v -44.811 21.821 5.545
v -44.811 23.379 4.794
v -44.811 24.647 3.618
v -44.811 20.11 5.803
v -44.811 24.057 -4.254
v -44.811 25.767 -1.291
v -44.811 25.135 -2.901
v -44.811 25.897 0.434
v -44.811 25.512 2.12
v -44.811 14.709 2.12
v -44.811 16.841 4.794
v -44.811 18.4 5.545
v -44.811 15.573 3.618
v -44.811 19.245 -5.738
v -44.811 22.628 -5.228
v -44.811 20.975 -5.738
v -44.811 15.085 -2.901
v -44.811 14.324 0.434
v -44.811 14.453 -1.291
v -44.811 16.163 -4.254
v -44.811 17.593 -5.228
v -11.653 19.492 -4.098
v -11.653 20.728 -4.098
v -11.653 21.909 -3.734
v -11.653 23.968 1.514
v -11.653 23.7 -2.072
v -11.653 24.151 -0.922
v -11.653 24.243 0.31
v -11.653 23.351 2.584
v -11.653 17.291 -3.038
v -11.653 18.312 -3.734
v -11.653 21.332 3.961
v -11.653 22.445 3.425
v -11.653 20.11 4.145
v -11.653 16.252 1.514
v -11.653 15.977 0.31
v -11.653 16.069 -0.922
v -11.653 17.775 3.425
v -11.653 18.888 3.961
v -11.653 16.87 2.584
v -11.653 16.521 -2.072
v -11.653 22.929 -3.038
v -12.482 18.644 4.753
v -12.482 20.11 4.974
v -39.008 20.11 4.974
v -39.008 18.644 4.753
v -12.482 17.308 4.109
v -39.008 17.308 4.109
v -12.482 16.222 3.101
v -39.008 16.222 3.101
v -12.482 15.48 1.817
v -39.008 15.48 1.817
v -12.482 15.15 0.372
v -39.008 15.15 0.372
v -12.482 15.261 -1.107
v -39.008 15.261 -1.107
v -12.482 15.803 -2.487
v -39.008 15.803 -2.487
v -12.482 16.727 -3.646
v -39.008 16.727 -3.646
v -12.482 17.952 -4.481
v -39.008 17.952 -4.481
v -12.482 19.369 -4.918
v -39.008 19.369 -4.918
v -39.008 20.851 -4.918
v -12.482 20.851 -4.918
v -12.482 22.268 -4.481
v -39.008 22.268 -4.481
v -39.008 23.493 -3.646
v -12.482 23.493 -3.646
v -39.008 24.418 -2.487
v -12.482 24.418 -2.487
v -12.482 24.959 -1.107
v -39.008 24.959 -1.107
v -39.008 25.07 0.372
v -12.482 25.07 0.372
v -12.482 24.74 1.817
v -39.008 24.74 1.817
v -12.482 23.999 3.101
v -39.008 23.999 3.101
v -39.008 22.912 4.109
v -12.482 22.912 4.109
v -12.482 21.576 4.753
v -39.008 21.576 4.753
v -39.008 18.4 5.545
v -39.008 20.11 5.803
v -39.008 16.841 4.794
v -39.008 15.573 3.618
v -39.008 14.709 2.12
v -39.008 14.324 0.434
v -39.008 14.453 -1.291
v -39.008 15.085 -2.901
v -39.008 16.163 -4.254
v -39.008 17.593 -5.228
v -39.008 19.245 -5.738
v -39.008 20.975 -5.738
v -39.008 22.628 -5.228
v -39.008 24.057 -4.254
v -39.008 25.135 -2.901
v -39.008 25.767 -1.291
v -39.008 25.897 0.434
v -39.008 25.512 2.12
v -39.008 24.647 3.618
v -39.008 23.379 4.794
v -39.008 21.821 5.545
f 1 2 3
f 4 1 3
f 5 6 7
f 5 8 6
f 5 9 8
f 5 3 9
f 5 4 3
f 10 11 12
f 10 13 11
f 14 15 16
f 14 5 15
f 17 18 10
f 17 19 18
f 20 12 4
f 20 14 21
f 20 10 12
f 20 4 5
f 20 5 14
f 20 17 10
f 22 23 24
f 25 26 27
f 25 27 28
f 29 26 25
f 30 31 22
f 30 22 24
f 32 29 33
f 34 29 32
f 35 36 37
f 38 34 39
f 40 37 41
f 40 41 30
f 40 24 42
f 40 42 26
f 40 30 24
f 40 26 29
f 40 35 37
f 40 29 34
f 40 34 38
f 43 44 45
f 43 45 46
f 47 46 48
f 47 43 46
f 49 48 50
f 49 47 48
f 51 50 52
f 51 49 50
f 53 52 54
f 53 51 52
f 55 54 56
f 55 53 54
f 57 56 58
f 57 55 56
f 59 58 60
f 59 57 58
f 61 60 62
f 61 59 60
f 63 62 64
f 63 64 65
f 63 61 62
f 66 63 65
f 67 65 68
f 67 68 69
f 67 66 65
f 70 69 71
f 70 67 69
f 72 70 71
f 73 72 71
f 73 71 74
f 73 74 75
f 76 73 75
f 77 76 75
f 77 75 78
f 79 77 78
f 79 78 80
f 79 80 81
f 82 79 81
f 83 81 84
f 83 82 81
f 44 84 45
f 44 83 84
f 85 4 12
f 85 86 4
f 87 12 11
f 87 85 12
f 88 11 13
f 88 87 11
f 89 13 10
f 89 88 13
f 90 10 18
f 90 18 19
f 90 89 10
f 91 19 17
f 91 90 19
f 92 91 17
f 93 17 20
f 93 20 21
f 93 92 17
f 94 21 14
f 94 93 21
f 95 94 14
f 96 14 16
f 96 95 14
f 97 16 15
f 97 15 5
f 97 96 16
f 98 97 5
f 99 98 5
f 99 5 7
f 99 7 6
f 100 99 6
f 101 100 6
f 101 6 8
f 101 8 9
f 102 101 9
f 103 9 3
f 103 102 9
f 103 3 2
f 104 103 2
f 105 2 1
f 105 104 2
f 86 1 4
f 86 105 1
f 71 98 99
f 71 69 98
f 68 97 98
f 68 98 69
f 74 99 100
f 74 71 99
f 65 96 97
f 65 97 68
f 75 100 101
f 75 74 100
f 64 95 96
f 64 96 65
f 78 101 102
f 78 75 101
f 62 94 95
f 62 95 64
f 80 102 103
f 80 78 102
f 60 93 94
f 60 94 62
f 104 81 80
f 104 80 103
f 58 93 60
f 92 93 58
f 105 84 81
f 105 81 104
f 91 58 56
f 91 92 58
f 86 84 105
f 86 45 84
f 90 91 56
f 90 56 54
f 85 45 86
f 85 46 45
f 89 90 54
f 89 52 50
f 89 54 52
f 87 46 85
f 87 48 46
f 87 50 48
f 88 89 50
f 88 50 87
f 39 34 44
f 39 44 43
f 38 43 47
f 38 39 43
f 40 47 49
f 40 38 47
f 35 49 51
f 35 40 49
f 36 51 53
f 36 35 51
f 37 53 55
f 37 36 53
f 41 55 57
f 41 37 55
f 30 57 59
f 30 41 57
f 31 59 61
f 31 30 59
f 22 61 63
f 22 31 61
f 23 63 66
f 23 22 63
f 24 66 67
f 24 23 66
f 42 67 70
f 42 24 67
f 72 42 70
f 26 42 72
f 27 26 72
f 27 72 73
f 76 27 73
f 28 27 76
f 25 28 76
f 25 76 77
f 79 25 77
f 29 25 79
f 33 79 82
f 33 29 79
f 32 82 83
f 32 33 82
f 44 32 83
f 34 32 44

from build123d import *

# Parameters (mm, degrees)
CHAMFER1_SIZE = 1
SCALE1_SCALE  = 0.828947368


with BuildPart() as part:
    # Sketch1 → Revolve1 (revolve)
    with BuildSketch(Plane.XY, mode=Mode.PRIVATE) as revolve1_sk:
        Polygon((-41.050847458, 26.110169492), (-8.050847458, 26.110169492), (-8.050847458, 20.110169492), (-41.050847458, 20.110169492), (-48.050847458, 20.110169492), (-48.050847458, 27.110169492), (-41.050847458, 27.110169492), align=None)
    revolve(revolve1_sk.sketch.rotate(Axis((-48.881355932, 20.110169492, 0), (1, 0, 0)), 90), axis=Axis((-48.881355932, 20.110169492, 0), (1, 0, 0)))

    # Chamfer1
    chamfer1_edges = [part.edges().sort_by_distance(p)[0] for p in [
        (-8.050847458, 20.110169492, -6),
    ]]
    chamfer(chamfer1_edges, length=CHAMFER1_SIZE)


with BuildPart() as part_1:
    # Scale1: scaled about (-29.108266601, 20.110169492, 0)
    add(part.part.scale(SCALE1_SCALE).moved(Location((-4.979045615, 3.439897422, 0))))


solid = part_1.part
